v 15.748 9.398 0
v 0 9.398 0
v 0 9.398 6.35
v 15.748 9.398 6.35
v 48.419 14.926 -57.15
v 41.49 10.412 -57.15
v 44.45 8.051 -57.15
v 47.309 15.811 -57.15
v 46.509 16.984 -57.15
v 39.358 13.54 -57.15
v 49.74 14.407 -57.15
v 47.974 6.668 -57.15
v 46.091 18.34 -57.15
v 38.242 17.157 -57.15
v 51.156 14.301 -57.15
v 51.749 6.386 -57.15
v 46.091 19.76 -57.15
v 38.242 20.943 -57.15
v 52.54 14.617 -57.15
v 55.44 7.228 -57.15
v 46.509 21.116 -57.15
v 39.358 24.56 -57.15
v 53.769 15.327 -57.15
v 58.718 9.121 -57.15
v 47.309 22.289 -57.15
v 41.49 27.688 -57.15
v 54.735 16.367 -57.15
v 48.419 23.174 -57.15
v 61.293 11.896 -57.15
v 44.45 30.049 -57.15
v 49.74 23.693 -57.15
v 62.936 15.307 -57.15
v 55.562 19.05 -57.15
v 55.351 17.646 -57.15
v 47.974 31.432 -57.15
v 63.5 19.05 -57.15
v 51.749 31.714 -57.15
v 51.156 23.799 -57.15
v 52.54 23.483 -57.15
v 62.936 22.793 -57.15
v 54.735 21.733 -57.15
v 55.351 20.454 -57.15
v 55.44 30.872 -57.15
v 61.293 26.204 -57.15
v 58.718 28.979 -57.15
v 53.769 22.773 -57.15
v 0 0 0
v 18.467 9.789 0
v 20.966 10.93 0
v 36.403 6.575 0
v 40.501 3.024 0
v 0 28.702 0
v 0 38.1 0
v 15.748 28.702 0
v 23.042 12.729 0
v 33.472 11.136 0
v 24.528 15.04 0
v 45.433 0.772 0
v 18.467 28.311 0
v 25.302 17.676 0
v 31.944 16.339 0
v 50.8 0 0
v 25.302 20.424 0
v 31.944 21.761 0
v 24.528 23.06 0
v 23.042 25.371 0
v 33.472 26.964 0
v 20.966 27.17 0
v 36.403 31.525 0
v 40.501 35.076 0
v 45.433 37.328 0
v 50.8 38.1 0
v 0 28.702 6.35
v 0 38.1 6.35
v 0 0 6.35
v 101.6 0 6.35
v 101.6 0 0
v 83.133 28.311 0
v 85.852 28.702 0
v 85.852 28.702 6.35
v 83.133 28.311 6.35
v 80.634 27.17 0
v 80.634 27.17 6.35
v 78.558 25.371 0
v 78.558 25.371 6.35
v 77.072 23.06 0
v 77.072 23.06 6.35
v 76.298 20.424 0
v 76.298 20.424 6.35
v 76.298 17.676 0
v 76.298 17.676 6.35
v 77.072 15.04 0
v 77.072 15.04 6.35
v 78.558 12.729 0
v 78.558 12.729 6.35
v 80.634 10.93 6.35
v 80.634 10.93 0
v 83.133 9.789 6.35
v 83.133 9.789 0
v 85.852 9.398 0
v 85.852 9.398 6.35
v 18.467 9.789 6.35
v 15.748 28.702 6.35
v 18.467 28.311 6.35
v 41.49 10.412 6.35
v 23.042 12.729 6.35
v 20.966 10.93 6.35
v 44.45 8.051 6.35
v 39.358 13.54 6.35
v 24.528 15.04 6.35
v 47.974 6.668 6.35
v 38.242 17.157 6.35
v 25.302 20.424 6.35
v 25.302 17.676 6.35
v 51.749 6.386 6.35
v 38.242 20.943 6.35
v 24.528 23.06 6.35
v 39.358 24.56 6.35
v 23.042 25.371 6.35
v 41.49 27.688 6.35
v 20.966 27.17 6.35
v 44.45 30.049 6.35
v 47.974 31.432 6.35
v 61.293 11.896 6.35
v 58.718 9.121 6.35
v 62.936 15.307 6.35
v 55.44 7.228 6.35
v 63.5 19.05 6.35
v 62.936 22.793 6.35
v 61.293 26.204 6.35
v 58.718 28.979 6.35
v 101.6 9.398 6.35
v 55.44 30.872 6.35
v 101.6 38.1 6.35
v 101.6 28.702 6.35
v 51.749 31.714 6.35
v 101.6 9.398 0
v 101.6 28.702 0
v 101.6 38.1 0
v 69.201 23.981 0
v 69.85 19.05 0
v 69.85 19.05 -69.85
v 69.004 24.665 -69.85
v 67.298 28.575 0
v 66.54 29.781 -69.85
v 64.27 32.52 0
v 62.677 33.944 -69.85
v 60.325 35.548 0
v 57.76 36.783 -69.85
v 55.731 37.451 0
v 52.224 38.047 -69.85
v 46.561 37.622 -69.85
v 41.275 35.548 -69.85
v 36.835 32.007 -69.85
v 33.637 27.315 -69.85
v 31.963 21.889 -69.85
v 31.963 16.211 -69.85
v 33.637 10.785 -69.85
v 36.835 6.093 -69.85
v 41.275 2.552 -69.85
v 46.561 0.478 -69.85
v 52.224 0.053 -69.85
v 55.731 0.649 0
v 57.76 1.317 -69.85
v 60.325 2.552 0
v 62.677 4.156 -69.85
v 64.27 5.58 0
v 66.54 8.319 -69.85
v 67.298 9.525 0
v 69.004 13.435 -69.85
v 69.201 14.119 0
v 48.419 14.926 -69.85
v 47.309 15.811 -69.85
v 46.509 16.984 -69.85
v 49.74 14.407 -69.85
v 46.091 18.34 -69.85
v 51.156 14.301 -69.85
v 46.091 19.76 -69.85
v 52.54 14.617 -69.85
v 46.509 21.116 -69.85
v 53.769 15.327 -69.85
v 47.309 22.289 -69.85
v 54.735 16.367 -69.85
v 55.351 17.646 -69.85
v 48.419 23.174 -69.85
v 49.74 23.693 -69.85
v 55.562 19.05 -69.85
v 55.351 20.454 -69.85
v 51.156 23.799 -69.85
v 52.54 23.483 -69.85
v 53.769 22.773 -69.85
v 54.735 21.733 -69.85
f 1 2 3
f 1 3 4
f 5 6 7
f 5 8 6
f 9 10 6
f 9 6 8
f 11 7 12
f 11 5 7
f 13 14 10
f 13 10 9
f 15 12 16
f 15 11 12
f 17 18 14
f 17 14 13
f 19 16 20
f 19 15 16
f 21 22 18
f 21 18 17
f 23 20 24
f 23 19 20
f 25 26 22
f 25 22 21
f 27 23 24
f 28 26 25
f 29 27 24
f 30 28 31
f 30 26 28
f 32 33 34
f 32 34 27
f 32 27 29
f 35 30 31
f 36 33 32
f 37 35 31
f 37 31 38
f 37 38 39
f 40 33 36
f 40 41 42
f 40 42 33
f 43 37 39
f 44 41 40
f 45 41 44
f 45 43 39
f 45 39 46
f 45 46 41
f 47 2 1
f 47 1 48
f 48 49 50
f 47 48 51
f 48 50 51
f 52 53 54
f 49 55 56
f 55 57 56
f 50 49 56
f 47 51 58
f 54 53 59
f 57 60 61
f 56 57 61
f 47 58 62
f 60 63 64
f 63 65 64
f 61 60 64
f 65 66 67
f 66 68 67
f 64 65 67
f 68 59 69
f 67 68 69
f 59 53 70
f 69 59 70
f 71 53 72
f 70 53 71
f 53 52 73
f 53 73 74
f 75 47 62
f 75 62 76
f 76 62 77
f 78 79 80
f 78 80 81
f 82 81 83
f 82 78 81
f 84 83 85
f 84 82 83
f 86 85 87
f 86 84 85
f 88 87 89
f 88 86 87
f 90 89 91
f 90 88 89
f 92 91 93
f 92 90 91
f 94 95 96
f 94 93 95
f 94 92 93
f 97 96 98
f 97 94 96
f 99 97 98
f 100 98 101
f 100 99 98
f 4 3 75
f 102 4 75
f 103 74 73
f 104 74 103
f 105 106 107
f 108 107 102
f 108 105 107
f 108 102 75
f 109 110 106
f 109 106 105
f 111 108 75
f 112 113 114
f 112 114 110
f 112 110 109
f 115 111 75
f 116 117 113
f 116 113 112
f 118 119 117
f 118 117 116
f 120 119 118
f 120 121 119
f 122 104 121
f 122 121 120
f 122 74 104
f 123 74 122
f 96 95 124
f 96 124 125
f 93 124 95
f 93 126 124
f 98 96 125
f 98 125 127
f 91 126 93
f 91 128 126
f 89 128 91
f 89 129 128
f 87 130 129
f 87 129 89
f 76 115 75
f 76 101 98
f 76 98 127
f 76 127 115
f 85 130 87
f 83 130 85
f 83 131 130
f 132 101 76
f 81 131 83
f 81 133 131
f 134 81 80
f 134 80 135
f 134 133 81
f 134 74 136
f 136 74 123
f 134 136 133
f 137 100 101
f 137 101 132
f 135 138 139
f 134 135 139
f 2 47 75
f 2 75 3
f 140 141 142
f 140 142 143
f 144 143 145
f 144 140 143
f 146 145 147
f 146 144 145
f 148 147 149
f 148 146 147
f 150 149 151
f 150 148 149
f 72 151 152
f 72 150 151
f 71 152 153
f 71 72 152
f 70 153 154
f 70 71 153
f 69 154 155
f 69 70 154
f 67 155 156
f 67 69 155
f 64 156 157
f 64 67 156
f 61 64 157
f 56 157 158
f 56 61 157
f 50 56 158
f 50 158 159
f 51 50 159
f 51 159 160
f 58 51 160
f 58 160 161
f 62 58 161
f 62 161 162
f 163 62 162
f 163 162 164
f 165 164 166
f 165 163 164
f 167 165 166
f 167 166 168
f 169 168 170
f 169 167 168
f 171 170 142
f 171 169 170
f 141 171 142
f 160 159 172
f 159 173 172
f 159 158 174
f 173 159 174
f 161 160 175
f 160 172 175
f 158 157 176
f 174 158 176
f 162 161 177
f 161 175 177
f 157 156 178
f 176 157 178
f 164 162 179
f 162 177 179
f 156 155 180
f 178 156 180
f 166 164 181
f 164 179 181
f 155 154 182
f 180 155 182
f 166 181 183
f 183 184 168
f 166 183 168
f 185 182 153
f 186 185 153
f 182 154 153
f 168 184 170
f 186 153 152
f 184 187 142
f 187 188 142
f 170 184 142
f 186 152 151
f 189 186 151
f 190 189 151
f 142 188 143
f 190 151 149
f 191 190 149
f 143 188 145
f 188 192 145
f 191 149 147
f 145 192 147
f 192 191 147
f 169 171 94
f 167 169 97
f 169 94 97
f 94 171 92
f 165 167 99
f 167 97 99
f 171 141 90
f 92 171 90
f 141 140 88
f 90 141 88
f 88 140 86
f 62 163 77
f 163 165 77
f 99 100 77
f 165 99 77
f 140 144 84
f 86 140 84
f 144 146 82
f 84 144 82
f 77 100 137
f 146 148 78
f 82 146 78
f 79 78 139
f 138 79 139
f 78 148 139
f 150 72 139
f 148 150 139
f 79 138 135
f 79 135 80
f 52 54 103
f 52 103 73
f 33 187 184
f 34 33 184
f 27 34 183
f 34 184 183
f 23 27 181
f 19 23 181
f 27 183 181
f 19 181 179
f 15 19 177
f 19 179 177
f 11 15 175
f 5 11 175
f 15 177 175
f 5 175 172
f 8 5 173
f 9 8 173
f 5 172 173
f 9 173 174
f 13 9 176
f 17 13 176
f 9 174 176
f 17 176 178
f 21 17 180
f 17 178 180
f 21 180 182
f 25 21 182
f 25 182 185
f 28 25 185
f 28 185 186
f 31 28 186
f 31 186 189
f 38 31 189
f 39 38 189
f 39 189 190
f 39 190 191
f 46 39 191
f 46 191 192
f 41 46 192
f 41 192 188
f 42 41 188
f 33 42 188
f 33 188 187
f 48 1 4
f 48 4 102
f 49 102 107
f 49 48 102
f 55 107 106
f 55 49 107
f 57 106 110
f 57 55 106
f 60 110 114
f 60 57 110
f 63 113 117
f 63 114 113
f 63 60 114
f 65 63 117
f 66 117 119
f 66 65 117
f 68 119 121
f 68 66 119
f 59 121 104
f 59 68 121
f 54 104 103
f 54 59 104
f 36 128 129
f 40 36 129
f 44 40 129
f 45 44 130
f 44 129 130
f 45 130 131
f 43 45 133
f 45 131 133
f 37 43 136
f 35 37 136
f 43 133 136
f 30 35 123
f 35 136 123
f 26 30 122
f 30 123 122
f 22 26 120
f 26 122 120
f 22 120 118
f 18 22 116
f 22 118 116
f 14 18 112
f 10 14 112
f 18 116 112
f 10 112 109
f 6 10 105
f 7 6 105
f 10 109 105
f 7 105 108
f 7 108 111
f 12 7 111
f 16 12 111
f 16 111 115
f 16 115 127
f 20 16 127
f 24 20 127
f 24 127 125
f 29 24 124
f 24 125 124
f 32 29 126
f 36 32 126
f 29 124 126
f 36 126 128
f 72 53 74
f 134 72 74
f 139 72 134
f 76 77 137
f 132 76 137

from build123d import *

# Parameters (mm, degrees)
F0_W     = 101.6
F0_H     = 38.1
F1_DEPTH = 6.35
F3_DEPTH = 25.4
F4_R     = 19.05
F5_DEPTH = 69.85
F6_R     = 12.7
F7_DEPTH = 63.5
F8_R     = 4.7625
F9_DEPTH = 76.201


with BuildPart() as f1:
    # F0 (on Top) → F1 (new body)
    with BuildSketch(Plane.XY):
        with Locations((50.8, 19.05)):
            Rectangle(F0_W, F0_H)
    extrude(amount=F1_DEPTH)

    # F2 (on Top) → F3 (cut)
    with BuildSketch(Plane.XY):
        with BuildLine():
            Line((15.748, 28.702), (0, 28.702))
            Line((0, 28.702), (0, 9.398))
            Line((0, 9.398), (15.748, 9.398))
            ThreePointArc((15.748, 9.398), (25.4, 19.05), (15.748, 28.702))
        make_face()
        with BuildLine():
            Line((101.6, 9.398), (101.6, 28.702))
            Line((101.6, 28.702), (85.852, 28.702))
            ThreePointArc((85.852, 28.702), (76.2, 19.05), (85.852, 9.398))
            Line((85.852, 9.398), (101.6, 9.398))
        make_face()
    extrude(amount=F3_DEPTH, mode=Mode.SUBTRACT)

    # F4 (on face) → F5 (join)
    with BuildSketch(Plane.XY):
        with Locations((50.8, 19.05)):
            Circle(F4_R)
    extrude(amount=-F5_DEPTH)

    # F6 (on face) → F7 (cut)
    with BuildSketch(Plane.XY.offset(6.35)):
        with Locations((50.8, 19.05)):
            Circle(F6_R)
    extrude(amount=-F7_DEPTH, mode=Mode.SUBTRACT)

    # F8 (on face) → F9 (cut, through all)
    with BuildSketch(Plane(origin=(0, 0, -69.85), x_dir=(1, 0, 0), z_dir=(0, 0, -1))):
        with Locations((50.8, -19.05)):
            Circle(F8_R)
    extrude(amount=-F9_DEPTH, mode=Mode.SUBTRACT)


solid = f1.part
